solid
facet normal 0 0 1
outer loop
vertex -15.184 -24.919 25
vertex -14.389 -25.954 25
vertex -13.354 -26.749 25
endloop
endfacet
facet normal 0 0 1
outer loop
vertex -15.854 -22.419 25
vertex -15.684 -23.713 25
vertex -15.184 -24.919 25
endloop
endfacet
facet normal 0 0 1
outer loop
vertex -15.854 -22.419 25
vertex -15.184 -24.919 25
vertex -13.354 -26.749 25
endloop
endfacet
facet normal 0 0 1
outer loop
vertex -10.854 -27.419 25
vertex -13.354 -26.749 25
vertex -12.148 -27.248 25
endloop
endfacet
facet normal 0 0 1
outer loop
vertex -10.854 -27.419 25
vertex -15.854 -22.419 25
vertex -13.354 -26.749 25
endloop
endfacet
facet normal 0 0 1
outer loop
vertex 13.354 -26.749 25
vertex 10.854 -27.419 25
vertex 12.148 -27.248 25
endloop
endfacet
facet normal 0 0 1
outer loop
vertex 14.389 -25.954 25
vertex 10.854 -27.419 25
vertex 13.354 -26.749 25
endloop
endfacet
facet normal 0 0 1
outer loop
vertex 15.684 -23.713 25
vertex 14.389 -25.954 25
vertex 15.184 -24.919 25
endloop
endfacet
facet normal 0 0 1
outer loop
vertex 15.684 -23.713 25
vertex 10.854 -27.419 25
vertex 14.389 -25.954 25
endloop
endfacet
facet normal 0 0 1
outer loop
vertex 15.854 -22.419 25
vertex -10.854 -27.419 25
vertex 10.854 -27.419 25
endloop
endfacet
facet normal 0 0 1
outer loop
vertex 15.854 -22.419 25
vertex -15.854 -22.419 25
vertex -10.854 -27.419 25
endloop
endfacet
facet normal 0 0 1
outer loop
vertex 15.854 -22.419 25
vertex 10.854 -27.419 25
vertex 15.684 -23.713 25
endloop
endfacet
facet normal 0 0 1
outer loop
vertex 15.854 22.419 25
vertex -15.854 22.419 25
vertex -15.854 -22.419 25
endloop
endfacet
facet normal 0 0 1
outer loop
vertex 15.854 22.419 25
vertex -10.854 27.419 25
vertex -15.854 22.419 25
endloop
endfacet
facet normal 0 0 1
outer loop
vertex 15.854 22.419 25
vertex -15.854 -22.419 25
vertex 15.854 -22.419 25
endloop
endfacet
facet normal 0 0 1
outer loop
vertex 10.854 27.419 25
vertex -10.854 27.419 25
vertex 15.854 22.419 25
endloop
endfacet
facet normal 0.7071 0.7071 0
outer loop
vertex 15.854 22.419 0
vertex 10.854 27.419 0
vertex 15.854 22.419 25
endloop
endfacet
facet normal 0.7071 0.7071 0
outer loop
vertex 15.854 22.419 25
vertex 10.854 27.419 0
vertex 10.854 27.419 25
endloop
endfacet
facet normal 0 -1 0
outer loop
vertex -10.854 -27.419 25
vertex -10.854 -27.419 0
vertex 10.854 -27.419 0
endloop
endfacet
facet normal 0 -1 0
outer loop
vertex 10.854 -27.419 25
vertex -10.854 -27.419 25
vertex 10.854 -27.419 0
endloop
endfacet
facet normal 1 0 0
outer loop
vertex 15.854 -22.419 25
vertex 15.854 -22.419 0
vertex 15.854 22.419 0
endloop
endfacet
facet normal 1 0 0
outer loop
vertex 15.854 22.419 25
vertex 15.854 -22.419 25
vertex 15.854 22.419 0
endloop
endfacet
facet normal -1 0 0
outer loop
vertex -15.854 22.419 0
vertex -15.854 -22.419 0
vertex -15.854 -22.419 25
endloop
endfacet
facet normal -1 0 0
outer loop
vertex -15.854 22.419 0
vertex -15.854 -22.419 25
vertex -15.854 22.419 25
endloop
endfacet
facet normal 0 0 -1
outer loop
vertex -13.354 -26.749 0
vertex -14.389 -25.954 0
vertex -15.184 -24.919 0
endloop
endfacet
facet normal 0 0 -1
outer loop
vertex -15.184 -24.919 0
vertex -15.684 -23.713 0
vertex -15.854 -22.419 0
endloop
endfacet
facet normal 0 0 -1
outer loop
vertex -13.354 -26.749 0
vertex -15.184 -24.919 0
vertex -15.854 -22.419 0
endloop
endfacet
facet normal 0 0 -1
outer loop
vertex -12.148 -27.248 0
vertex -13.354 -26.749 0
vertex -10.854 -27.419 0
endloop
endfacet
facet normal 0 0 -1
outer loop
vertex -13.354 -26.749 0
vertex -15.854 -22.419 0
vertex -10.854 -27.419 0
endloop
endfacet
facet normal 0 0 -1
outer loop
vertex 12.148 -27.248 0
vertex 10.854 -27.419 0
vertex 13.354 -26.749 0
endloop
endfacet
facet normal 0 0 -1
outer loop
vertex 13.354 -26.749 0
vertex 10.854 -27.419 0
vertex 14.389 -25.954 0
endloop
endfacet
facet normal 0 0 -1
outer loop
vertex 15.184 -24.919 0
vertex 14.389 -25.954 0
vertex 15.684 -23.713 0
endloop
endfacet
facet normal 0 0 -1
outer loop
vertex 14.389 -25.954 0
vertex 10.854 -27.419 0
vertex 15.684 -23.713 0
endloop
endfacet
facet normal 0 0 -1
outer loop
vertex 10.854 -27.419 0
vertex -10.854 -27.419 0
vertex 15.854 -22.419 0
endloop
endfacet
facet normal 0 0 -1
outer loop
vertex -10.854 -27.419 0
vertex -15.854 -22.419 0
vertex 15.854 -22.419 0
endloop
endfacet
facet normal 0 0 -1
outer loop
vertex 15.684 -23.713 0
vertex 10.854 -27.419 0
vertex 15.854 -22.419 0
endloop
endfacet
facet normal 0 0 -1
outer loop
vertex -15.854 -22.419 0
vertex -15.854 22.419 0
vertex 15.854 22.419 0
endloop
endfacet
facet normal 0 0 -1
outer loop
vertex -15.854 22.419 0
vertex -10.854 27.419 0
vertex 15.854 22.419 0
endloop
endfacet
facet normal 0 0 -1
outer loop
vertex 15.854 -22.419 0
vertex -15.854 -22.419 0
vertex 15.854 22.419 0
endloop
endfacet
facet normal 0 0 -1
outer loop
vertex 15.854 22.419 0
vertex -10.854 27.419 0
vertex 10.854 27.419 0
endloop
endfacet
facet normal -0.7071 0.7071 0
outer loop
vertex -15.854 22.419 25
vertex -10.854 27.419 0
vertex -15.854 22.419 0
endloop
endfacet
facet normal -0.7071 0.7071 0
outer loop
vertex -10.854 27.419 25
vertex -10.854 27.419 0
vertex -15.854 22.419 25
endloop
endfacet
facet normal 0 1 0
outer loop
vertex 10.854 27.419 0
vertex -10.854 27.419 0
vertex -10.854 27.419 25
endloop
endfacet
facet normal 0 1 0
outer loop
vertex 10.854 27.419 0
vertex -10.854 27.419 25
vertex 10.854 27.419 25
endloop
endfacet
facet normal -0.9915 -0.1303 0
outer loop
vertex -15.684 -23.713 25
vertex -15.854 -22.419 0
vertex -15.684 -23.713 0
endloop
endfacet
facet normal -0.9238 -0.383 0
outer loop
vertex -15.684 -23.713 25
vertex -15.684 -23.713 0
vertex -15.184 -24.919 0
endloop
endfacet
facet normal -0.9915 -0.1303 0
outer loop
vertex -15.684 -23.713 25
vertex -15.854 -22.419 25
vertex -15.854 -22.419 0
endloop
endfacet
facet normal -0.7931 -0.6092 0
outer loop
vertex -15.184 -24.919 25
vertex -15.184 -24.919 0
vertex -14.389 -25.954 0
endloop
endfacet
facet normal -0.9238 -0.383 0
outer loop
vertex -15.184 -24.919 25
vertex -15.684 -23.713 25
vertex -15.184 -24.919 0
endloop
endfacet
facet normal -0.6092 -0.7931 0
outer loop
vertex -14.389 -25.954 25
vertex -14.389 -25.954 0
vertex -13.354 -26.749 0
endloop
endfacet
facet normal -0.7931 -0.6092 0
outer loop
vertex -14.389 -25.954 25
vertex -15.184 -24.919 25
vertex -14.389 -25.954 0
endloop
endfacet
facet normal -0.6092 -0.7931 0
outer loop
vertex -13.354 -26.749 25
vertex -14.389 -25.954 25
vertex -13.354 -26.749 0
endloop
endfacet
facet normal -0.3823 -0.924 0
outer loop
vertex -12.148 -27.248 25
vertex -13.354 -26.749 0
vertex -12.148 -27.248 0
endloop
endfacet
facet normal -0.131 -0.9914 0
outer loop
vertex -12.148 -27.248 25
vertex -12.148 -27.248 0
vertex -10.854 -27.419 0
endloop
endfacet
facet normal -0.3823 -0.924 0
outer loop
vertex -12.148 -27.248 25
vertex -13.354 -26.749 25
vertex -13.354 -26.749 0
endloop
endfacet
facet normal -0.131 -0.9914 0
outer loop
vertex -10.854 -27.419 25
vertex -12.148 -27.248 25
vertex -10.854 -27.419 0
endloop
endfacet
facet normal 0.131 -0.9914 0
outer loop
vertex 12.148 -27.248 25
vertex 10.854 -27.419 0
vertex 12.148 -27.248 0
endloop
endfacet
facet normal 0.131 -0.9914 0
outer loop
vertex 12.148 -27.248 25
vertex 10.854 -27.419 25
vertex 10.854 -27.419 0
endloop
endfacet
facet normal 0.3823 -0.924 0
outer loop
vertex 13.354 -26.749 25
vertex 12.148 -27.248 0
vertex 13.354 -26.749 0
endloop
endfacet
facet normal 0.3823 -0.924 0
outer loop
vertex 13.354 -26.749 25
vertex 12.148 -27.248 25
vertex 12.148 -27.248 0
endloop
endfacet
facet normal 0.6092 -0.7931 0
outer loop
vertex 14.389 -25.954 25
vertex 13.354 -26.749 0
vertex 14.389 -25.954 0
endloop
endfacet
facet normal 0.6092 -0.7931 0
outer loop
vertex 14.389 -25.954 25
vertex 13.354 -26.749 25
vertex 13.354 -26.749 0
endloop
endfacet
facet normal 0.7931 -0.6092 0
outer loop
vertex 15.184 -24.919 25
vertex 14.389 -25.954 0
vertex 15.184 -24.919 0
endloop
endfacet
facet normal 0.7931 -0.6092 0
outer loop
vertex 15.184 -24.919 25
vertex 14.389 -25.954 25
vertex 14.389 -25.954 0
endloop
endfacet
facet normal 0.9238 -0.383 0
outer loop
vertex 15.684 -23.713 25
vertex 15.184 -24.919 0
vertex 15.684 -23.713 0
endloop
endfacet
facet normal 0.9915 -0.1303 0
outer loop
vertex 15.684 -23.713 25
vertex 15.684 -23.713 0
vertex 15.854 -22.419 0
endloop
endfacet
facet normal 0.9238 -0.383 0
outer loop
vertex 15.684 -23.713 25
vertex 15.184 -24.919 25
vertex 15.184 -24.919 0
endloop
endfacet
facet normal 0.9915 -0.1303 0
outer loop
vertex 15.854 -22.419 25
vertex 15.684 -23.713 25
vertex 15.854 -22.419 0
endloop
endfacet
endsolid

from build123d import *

# Parameters (mm, degrees)
F0_W     = 31.707764
F0_H     = 54.837252
F1_DEPTH = 25
F2_SIZE  = 5
F3_R     = 5


with BuildPart() as f1:
    # F0 (on Top) → F1 (new body)
    with BuildSketch(Plane.XY):
        Rectangle(F0_W, F0_H)
    extrude(amount=F1_DEPTH)

    # F2
    f2_edges = [f1.edges().sort_by_distance(p)[0] for p in [
        (15.853882, 27.418626, 12.5),
        (-15.853882, 27.418626, 12.5),
    ]]
    chamfer(f2_edges, length=F2_SIZE)

    # F3
    f3_edges = [f1.edges().sort_by_distance(p)[0] for p in [
        (-15.853882, -27.418626, 12.5),
        (15.853882, -27.418626, 12.5),
    ]]
    fillet(f3_edges, radius=F3_R)


solid = f1.part
